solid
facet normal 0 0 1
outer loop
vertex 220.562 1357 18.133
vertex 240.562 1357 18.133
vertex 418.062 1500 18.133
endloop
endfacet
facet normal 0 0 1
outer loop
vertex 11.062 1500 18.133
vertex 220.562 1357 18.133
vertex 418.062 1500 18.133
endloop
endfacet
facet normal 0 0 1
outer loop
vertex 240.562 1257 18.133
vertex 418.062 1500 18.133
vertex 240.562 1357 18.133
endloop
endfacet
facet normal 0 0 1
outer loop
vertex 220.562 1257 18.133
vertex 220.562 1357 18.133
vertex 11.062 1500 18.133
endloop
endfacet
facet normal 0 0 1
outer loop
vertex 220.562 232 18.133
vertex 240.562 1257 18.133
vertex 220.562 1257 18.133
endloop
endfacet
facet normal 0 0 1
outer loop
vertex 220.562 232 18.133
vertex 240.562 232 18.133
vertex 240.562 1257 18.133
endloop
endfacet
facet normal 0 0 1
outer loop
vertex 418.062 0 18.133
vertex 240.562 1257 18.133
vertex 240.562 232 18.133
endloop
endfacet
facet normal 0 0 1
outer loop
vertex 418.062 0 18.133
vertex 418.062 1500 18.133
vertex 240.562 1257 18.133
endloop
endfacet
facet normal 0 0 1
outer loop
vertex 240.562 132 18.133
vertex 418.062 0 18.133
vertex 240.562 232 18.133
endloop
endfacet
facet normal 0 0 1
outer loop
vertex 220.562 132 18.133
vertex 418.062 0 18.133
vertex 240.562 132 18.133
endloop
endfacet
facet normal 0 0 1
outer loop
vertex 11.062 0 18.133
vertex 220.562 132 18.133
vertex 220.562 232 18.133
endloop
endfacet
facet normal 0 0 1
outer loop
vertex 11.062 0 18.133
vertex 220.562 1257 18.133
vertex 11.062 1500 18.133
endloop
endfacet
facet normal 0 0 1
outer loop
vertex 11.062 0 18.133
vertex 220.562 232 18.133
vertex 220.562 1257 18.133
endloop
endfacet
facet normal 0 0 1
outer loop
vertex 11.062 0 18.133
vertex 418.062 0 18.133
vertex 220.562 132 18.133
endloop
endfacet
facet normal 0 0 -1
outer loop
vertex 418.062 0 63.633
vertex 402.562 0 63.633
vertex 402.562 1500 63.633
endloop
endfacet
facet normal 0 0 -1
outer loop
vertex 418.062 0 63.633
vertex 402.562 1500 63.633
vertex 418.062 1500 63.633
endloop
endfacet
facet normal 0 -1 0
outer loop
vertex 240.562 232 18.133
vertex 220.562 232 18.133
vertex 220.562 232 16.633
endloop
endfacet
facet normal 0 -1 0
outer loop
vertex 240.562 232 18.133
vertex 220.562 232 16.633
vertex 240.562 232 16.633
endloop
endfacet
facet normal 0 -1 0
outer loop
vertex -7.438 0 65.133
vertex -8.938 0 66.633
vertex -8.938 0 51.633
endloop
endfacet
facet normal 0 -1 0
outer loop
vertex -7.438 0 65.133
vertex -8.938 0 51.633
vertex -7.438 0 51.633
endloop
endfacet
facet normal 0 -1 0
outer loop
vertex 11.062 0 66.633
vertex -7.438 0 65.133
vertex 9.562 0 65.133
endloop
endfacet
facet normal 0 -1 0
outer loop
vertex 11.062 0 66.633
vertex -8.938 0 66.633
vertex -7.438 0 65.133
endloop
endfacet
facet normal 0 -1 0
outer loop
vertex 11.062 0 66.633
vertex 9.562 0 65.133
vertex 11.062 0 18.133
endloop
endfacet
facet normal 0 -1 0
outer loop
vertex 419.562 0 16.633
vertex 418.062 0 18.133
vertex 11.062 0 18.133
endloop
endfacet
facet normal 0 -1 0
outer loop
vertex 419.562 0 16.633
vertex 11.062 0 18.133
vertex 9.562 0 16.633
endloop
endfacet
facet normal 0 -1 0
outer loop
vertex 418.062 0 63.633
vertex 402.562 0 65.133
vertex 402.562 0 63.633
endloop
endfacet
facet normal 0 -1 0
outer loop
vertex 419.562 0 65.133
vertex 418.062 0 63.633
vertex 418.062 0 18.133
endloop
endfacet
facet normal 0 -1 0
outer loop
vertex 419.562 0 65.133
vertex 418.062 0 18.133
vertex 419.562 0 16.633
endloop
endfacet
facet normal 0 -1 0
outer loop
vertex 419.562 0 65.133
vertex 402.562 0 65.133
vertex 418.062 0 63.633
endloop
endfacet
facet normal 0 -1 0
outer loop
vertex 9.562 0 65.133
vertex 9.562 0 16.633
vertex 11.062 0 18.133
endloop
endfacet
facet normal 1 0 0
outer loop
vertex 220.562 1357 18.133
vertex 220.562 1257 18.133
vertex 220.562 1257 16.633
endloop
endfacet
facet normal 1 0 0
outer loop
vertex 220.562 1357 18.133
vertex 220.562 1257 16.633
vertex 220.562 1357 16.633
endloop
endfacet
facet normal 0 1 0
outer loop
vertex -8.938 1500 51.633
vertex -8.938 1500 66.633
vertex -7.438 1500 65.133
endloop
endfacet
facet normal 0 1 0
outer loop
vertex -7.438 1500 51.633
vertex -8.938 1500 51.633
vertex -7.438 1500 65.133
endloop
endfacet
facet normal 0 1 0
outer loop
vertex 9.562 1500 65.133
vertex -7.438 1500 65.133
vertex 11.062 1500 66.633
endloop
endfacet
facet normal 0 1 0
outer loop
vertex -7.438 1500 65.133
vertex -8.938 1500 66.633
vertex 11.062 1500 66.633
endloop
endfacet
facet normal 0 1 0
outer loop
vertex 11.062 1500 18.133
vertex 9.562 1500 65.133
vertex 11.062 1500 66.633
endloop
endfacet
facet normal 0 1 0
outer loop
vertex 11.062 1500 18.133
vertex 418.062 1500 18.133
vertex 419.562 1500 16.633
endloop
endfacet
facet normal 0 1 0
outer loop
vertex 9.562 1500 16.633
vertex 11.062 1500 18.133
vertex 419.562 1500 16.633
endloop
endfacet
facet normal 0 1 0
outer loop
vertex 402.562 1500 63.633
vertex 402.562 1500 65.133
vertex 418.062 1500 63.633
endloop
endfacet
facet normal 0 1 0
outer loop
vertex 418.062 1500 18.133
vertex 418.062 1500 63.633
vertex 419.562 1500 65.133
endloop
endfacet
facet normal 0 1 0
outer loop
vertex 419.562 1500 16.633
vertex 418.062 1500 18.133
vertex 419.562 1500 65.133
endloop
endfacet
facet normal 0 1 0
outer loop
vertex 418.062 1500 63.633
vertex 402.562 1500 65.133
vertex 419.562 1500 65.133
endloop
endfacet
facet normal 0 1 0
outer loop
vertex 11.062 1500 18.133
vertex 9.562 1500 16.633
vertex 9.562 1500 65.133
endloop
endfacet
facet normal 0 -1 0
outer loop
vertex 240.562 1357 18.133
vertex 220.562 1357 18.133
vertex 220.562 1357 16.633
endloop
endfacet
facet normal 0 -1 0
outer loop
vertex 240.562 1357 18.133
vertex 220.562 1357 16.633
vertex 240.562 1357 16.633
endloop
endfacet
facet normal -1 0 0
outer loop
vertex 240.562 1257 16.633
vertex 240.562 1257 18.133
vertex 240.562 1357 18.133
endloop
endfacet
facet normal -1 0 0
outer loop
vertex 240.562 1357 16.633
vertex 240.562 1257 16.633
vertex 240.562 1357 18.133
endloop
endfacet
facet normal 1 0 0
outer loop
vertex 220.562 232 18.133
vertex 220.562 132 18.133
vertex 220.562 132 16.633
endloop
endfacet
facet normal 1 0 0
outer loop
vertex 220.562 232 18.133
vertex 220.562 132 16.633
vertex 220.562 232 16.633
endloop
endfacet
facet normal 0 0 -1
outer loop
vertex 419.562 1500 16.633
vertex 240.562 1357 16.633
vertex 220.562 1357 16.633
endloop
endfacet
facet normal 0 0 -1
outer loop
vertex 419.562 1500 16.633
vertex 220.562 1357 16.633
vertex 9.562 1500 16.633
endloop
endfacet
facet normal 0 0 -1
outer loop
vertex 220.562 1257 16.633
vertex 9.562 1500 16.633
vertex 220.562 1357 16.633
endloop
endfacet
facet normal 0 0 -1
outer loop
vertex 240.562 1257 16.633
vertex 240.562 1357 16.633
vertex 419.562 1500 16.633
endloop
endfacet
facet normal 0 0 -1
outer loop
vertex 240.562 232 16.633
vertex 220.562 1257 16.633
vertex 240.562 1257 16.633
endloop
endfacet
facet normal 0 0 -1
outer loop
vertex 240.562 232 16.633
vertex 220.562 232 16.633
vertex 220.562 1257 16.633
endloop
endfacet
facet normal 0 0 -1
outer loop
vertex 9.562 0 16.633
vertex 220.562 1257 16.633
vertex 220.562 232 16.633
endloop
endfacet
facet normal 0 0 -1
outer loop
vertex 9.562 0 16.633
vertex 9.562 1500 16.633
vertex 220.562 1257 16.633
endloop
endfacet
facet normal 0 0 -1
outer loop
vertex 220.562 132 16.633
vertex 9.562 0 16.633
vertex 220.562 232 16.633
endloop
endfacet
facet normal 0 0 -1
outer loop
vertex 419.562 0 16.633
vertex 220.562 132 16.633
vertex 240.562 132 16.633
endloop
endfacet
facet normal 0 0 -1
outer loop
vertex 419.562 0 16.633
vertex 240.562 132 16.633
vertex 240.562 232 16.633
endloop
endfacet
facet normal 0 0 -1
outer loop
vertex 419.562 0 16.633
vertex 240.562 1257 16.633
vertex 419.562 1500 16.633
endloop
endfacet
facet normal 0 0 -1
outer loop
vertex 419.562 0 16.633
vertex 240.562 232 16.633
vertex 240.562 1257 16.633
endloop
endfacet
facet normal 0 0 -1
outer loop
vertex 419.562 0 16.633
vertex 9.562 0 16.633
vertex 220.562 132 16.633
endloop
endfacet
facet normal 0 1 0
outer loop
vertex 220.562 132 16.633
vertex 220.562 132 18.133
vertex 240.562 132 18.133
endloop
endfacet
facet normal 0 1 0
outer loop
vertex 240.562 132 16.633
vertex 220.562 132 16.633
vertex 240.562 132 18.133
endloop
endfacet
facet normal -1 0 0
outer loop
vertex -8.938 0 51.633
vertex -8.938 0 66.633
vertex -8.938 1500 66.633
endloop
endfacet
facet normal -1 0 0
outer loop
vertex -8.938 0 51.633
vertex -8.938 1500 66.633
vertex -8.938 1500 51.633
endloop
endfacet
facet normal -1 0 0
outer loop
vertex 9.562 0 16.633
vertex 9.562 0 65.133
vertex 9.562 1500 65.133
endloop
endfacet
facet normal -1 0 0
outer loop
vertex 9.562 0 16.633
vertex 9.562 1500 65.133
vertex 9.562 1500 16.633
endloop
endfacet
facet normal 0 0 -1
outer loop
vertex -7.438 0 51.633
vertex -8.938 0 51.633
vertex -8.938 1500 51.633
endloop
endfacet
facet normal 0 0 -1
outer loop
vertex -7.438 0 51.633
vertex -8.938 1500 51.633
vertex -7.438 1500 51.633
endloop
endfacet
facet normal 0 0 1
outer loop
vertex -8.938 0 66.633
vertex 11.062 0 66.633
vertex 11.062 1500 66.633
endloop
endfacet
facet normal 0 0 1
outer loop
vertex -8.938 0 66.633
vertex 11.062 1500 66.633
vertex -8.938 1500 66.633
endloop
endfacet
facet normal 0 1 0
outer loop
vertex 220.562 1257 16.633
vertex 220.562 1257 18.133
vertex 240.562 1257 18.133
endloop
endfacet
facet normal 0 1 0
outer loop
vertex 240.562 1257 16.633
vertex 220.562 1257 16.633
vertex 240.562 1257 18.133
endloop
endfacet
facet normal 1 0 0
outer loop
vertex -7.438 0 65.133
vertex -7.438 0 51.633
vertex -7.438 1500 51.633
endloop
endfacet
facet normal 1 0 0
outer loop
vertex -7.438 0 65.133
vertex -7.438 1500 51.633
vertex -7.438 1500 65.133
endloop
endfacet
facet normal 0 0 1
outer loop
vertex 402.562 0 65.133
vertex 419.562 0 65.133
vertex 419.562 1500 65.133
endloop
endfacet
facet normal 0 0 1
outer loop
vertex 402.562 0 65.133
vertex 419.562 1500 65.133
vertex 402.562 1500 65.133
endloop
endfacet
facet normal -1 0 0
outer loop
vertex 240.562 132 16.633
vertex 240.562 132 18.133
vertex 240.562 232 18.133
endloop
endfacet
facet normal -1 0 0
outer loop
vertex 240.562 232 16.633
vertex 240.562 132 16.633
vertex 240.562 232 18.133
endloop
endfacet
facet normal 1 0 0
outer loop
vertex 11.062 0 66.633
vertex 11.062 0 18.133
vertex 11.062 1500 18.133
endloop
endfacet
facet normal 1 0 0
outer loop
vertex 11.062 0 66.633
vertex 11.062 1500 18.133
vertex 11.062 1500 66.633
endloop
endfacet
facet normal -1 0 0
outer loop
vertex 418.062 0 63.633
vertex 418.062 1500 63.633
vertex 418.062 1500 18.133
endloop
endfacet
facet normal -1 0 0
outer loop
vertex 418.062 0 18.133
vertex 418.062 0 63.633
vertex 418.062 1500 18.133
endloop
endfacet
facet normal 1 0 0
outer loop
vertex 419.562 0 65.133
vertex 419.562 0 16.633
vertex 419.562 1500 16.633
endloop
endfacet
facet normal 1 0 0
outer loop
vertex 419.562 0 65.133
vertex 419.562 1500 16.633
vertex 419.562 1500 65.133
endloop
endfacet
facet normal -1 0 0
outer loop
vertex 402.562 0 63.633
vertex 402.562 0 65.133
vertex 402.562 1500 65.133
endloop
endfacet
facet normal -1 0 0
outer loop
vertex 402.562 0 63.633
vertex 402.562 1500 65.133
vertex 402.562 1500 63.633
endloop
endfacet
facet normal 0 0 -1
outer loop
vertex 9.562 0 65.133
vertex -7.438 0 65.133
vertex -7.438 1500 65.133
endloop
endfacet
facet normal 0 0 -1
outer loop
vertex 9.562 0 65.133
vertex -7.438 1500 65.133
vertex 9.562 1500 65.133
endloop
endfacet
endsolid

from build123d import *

# Parameters (mm, degrees)
F1_DEPTH = 1500
F2_W     = 20
F2_H     = 100
F3_DEPTH = 1.5


with BuildPart() as f1:
    # F0 (on Front) → F1 (new body)
    with BuildSketch(Plane.XZ):
        Polygon((9.56153, 65.133369), (9.56153, 16.633369), (419.56153, 16.633369), (419.56153, 65.133369), (402.56153, 65.133369), (402.56153, 63.633369), (418.06153, 63.633369), (418.06153, 18.133369), (11.06153, 18.133369), (11.06153, 66.633369), (-8.93847, 66.633369), (-8.93847, 51.633369), (-7.43847, 51.633369), (-7.43847, 65.133369), align=None)
    extrude(amount=-F1_DEPTH)

    # F2 (on face) → F3 (cut, through all)
    with BuildSketch(Plane.XY.offset(18.133369)):
        with Locations((230.56153, 182)):
            Rectangle(F2_W, F2_H)
        with Locations((230.56153, 1307)):
            Rectangle(F2_W, F2_H)
    extrude(amount=-F3_DEPTH, mode=Mode.SUBTRACT)


solid = f1.part
